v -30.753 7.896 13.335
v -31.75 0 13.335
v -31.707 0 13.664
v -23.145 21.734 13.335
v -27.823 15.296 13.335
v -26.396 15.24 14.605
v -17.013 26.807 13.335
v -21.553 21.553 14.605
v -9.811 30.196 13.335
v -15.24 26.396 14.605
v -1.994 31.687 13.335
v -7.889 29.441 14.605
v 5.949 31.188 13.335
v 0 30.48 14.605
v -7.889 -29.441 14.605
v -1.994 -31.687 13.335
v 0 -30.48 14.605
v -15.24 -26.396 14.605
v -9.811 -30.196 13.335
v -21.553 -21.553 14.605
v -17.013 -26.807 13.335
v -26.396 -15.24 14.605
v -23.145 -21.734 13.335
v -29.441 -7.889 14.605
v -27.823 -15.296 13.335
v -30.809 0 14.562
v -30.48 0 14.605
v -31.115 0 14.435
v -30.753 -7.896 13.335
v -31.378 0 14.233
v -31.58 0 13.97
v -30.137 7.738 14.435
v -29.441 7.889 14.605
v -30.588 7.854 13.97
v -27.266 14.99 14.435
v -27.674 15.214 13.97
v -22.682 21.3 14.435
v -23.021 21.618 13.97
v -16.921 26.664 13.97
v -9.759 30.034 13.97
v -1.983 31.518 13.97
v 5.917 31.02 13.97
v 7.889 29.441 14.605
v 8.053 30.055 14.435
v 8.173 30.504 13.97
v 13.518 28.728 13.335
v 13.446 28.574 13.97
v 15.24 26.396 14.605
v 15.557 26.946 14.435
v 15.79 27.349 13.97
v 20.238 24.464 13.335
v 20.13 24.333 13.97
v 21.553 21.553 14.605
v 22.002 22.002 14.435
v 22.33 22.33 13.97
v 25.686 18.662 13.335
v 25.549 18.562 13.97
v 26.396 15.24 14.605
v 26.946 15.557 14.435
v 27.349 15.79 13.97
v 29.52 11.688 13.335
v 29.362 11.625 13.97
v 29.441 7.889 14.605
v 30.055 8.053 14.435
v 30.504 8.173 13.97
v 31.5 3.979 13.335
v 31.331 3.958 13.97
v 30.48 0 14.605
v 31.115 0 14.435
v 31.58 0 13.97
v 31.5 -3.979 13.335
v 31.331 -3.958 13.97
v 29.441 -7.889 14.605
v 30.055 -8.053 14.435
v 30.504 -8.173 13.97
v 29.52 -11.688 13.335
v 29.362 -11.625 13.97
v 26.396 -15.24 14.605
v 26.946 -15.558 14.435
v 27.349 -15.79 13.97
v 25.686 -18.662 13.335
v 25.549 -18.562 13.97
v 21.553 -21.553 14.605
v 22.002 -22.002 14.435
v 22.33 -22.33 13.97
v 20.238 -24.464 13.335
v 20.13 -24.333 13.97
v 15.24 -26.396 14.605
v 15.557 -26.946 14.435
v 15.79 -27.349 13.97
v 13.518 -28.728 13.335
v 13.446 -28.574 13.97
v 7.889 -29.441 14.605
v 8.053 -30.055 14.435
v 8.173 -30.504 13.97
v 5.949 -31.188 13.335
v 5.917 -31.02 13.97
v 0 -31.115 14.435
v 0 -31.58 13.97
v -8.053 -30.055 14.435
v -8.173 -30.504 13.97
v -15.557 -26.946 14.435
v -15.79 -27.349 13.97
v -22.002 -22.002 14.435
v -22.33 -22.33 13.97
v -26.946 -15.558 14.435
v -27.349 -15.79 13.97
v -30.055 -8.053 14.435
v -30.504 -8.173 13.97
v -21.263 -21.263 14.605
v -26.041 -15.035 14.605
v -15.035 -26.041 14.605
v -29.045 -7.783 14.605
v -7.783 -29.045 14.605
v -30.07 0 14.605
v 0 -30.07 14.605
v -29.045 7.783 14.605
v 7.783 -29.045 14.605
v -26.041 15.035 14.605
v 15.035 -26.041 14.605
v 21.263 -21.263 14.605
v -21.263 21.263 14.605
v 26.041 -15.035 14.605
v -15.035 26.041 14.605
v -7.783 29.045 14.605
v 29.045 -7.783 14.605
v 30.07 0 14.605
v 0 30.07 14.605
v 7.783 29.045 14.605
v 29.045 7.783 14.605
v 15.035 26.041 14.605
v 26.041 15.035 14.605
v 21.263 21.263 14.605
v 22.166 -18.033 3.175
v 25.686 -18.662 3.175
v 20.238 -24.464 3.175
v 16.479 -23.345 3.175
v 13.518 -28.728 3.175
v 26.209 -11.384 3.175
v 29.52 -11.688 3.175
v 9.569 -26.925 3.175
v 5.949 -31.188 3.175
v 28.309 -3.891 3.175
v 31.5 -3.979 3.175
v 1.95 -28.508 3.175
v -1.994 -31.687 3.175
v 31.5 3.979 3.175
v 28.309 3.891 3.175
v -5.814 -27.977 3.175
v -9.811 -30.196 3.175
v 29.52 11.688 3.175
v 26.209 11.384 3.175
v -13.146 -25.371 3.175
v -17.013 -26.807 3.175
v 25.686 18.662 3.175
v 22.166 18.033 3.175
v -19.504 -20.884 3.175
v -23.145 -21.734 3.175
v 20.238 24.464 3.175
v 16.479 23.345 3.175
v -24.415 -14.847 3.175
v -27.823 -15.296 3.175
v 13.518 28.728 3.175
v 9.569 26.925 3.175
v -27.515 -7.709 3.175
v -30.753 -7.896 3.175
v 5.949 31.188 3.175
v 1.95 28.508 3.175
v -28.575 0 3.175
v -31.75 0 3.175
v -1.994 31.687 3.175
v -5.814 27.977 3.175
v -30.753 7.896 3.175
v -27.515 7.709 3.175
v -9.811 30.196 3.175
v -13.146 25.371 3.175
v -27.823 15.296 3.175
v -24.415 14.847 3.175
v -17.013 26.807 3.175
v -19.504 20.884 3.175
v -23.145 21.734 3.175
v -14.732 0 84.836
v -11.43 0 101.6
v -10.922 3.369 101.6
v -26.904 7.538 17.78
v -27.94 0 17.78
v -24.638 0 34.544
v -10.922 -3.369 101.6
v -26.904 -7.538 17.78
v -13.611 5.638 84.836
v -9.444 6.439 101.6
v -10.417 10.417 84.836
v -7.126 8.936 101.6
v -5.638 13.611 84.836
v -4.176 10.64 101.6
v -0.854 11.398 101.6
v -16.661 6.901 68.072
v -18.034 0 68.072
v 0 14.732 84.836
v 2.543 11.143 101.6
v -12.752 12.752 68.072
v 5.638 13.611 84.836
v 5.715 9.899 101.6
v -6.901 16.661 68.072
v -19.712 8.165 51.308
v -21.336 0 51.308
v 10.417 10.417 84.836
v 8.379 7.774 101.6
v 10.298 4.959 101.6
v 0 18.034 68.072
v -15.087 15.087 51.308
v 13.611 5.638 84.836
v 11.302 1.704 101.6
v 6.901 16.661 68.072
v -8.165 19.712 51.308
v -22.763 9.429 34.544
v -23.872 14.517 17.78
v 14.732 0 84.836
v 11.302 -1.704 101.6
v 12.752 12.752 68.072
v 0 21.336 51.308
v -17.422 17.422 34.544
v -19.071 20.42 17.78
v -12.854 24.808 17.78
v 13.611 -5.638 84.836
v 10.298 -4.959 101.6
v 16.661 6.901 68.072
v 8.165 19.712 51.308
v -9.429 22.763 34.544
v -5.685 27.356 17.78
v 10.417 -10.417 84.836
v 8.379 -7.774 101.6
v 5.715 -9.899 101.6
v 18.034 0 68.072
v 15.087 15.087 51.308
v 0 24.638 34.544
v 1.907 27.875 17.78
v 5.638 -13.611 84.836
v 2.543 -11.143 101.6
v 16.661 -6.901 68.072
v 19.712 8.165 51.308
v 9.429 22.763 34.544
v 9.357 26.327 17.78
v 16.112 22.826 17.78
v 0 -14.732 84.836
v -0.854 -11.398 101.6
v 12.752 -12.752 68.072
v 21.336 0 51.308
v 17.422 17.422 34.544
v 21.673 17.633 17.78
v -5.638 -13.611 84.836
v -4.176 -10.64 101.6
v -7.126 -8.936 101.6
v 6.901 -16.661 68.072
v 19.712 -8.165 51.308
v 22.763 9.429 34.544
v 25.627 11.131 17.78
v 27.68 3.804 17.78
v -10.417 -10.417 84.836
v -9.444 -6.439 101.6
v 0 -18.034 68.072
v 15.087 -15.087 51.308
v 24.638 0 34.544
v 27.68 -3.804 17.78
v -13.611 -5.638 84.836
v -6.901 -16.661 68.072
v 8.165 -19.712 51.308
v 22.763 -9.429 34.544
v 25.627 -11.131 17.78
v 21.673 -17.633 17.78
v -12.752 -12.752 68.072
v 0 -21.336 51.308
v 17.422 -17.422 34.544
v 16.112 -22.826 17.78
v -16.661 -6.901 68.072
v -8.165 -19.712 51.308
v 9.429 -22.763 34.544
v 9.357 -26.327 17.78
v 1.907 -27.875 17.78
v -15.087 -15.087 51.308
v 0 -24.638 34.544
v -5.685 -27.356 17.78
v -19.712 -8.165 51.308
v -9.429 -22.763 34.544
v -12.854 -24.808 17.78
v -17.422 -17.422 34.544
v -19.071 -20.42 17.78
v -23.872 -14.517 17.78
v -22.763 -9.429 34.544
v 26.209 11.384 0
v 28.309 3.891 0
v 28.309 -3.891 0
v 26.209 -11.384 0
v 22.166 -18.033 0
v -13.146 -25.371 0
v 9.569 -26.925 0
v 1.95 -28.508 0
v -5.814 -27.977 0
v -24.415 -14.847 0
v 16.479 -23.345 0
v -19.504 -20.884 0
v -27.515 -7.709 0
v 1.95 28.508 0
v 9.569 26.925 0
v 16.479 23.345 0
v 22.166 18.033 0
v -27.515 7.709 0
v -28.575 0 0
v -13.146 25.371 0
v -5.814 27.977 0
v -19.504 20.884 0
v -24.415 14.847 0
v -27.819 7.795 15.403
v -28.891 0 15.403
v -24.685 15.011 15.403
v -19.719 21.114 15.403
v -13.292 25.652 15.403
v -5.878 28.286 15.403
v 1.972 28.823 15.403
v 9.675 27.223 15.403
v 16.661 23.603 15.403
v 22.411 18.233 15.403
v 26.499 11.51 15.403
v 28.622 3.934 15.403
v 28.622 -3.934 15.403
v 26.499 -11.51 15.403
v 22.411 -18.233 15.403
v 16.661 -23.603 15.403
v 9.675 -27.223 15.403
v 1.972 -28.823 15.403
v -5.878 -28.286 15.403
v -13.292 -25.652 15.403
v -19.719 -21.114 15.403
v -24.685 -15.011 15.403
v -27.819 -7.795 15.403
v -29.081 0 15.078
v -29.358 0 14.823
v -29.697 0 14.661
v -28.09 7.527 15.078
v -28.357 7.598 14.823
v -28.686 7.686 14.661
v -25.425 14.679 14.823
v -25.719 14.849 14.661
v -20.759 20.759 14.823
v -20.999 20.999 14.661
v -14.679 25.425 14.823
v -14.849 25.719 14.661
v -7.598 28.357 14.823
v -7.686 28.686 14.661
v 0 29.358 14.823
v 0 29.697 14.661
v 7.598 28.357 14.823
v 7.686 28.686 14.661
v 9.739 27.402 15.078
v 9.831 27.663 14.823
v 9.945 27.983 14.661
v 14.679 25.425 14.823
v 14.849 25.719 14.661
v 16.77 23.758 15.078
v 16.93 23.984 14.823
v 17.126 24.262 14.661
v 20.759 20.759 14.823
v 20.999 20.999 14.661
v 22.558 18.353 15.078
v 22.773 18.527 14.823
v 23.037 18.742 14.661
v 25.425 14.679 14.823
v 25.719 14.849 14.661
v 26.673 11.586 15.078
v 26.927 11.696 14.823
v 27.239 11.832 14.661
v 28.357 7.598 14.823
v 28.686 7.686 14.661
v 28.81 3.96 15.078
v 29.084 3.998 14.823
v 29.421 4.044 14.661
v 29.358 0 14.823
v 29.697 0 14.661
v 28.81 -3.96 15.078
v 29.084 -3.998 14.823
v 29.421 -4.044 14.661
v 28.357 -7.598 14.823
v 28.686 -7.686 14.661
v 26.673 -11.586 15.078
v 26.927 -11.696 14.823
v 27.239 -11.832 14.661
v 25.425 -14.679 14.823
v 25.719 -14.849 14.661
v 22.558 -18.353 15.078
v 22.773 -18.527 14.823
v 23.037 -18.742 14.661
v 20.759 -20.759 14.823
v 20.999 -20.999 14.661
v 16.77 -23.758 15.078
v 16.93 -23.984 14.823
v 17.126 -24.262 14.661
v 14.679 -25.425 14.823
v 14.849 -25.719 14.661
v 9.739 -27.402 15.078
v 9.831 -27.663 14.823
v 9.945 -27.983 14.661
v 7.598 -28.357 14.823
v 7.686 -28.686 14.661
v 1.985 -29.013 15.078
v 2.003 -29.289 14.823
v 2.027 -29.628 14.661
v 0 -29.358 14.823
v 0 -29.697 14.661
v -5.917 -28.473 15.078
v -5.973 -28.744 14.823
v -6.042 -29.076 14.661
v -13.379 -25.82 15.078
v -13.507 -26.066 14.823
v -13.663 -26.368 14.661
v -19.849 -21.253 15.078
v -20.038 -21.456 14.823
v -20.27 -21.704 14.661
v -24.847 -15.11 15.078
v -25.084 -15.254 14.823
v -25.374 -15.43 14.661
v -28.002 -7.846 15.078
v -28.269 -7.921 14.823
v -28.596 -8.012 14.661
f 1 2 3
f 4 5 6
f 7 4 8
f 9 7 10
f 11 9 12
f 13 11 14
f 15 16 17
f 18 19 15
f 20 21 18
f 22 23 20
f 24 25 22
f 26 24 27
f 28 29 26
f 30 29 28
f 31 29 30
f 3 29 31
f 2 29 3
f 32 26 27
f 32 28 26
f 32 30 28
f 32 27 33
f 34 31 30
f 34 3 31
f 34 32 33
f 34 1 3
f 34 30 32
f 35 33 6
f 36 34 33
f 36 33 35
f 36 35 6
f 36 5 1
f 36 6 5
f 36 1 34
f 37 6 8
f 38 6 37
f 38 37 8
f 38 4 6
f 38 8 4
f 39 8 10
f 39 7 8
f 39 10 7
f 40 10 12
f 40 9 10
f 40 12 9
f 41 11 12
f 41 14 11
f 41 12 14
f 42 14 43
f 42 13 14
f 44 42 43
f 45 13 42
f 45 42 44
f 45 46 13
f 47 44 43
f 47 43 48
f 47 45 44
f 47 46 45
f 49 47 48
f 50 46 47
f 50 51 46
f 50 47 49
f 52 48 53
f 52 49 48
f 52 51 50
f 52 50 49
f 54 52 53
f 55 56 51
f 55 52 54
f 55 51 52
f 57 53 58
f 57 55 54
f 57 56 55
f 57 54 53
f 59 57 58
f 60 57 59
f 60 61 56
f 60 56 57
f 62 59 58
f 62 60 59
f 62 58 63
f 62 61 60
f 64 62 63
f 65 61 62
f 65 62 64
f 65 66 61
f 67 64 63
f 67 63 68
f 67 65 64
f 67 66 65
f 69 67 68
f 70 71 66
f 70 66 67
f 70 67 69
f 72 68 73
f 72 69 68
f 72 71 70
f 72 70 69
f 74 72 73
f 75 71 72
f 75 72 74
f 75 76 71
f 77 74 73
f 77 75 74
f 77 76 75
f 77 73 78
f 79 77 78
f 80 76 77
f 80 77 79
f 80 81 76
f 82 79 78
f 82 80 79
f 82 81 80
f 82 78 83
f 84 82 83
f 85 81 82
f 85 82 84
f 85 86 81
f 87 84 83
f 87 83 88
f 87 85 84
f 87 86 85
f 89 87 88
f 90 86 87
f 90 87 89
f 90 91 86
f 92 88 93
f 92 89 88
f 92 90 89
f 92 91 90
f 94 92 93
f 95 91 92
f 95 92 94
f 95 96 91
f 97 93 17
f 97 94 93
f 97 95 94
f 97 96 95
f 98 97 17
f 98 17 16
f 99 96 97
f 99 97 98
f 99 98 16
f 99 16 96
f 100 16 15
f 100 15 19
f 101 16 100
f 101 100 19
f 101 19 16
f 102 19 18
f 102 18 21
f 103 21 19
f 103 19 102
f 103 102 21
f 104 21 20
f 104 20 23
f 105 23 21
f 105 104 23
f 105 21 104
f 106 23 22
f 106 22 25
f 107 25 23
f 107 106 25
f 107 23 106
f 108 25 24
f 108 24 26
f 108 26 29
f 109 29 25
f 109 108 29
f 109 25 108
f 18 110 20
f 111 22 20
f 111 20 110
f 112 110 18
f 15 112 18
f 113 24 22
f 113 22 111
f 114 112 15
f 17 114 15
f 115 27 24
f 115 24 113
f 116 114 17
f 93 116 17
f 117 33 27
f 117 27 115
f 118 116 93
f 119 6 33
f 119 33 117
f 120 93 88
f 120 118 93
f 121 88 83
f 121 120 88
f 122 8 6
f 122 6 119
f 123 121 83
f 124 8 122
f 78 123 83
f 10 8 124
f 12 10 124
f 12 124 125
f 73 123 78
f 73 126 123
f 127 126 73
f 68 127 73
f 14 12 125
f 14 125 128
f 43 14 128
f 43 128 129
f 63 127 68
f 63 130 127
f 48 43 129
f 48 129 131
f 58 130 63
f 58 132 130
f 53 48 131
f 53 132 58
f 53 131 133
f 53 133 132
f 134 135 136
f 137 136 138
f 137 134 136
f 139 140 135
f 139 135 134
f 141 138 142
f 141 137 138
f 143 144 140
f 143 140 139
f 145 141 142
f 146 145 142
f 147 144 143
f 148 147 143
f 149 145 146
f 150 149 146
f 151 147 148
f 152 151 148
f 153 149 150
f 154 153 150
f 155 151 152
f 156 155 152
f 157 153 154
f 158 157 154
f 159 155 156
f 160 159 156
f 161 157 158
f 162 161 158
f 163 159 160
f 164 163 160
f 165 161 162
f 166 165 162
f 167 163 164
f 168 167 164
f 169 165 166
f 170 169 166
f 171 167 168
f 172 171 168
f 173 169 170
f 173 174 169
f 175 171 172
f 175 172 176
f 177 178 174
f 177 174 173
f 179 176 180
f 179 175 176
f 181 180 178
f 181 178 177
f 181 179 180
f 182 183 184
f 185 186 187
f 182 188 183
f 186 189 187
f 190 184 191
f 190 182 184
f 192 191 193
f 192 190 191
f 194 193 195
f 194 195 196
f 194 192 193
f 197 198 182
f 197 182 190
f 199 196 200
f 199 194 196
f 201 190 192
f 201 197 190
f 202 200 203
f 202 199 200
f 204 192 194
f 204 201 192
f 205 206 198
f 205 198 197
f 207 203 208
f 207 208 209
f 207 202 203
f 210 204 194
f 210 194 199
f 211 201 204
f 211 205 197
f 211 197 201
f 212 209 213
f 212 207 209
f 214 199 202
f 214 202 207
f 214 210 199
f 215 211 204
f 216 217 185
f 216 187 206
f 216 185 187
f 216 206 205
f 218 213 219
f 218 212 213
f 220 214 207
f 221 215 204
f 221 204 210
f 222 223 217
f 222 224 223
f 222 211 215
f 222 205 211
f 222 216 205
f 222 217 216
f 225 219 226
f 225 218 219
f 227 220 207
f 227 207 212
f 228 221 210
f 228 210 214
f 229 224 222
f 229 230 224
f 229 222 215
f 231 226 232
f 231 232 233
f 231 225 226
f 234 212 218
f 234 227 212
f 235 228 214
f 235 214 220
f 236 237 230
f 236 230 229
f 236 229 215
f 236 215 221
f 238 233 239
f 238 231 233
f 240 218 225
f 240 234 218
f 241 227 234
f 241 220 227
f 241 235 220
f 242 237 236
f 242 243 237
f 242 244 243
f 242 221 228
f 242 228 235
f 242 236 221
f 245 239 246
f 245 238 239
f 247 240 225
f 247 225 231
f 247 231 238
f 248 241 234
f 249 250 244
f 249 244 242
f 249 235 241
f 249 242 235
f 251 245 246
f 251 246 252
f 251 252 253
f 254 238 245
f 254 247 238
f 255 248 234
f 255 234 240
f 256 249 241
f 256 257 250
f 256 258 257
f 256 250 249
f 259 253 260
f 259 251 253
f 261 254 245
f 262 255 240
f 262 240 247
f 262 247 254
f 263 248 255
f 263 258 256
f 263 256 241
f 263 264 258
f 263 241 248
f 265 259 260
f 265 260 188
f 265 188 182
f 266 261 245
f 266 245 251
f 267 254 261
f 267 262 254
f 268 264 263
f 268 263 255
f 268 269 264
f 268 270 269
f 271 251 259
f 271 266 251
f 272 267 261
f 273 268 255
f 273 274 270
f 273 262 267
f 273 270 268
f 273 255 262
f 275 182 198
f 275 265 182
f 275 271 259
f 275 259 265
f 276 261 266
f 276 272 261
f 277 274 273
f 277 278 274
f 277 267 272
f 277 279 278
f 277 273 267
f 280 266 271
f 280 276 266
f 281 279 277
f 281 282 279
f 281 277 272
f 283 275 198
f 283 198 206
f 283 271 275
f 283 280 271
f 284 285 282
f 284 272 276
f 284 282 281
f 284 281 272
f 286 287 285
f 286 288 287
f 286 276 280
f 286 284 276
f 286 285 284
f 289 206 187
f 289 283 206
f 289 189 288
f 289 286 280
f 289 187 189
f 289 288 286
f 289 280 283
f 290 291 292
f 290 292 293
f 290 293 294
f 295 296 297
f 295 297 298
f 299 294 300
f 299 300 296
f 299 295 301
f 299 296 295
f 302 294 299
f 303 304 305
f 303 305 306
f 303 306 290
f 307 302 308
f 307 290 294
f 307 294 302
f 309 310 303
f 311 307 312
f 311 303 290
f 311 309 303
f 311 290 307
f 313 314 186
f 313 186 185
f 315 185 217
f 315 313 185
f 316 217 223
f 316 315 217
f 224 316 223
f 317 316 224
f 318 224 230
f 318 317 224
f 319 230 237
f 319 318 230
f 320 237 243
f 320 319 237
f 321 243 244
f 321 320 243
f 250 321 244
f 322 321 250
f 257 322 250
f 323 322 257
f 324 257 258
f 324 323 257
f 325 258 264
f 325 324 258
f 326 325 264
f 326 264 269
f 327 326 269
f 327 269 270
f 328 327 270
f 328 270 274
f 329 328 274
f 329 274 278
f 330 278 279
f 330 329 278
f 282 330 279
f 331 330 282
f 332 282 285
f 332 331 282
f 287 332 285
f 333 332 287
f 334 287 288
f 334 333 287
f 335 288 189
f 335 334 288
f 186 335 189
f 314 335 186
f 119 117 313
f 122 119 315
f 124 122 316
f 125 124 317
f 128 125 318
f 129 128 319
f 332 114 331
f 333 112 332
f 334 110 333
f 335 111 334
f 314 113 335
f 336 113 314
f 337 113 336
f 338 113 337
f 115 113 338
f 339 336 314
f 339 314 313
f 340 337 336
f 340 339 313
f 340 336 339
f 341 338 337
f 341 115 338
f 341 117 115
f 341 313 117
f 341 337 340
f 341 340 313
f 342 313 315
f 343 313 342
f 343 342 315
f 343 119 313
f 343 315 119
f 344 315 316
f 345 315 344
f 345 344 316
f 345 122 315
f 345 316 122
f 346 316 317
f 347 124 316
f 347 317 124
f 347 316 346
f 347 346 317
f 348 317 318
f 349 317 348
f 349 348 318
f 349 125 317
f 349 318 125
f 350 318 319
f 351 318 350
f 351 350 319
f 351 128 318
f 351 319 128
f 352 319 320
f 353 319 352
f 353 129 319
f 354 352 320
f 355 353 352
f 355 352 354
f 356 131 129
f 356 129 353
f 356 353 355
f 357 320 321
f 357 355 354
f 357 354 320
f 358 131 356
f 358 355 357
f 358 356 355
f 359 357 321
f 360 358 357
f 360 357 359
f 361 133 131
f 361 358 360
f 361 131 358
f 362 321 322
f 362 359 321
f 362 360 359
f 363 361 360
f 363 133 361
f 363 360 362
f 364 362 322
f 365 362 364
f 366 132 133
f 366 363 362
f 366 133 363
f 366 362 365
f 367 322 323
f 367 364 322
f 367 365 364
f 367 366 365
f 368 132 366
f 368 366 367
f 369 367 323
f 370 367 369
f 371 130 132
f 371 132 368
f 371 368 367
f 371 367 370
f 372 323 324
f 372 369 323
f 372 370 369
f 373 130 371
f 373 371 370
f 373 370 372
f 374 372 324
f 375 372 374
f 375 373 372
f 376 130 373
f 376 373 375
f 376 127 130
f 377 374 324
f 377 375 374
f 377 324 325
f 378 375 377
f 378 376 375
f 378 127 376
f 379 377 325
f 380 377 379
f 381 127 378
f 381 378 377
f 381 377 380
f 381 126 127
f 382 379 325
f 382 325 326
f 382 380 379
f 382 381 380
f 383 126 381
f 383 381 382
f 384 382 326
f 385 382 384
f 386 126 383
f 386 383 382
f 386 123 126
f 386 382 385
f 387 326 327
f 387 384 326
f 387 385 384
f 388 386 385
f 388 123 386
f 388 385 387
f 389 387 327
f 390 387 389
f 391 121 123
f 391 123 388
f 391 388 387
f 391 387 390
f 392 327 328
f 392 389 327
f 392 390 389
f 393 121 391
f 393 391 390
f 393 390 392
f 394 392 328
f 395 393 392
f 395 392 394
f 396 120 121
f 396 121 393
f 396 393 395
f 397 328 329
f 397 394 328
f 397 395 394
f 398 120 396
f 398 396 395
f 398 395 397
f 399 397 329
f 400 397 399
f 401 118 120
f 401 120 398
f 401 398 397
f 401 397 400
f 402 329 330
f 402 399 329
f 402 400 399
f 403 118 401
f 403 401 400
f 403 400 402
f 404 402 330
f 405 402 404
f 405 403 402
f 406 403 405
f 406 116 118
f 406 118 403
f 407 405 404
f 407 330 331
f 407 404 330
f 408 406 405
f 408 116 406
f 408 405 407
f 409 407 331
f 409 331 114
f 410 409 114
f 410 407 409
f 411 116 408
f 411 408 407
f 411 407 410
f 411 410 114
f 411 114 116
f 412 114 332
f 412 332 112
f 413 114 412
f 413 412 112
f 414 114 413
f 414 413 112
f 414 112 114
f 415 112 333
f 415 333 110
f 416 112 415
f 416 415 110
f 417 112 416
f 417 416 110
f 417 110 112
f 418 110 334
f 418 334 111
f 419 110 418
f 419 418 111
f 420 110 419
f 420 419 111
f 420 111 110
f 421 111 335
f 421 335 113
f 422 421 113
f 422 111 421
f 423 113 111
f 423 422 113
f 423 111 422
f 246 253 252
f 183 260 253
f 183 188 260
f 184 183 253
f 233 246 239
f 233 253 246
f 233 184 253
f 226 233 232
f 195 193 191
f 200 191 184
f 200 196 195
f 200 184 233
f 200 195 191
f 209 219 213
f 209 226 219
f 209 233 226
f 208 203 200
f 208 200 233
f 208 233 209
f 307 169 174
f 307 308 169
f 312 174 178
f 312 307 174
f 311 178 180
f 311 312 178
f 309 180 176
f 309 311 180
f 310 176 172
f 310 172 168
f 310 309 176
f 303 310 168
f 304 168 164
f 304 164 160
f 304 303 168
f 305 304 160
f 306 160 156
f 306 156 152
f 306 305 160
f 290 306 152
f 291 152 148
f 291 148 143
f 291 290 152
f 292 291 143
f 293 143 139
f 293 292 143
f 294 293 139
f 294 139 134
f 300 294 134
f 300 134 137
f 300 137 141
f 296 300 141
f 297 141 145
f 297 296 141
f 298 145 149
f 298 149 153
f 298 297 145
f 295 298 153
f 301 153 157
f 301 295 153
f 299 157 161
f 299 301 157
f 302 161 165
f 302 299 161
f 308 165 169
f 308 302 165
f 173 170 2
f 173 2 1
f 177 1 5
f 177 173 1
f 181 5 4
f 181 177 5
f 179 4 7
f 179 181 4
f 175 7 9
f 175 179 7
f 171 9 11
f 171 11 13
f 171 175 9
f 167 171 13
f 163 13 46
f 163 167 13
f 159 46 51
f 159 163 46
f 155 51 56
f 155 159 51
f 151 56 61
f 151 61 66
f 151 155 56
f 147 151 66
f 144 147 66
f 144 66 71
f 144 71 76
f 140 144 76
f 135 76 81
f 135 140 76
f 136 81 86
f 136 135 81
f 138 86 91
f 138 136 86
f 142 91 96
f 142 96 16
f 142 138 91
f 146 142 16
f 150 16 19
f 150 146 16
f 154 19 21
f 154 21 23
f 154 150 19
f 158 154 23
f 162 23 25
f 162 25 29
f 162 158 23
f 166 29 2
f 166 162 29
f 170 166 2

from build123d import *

# Parameters (mm, degrees)
F2_R = 1.27
F3_R = 1.27


with BuildPart() as f1:
    # F0 (on Front) → F1 (revolve)
    with BuildSketch(Plane.XZ):
        Polygon((-28.575, 0), (0, 0), (0, 101.6), (-11.43, 101.6), (-27.94, 17.78), (-29.21, 14.605), (-31.75, 14.605), (-31.75, 3.175), (-28.575, 3.175), align=None)
    revolve(axis=Axis((0, 0, 50.8), (0, 0, -1)))

    # F2
    f2_edges = [f1.edges().sort_by_distance(p)[0] for p in [
        (29.21, 0, 14.605),
    ]]
    fillet(f2_edges, radius=F2_R)

    # F3
    f3_edges = [f1.edges().sort_by_distance(p)[0] for p in [
        (31.75, 0, 14.605),
    ]]
    fillet(f3_edges, radius=F3_R)


solid = f1.part
